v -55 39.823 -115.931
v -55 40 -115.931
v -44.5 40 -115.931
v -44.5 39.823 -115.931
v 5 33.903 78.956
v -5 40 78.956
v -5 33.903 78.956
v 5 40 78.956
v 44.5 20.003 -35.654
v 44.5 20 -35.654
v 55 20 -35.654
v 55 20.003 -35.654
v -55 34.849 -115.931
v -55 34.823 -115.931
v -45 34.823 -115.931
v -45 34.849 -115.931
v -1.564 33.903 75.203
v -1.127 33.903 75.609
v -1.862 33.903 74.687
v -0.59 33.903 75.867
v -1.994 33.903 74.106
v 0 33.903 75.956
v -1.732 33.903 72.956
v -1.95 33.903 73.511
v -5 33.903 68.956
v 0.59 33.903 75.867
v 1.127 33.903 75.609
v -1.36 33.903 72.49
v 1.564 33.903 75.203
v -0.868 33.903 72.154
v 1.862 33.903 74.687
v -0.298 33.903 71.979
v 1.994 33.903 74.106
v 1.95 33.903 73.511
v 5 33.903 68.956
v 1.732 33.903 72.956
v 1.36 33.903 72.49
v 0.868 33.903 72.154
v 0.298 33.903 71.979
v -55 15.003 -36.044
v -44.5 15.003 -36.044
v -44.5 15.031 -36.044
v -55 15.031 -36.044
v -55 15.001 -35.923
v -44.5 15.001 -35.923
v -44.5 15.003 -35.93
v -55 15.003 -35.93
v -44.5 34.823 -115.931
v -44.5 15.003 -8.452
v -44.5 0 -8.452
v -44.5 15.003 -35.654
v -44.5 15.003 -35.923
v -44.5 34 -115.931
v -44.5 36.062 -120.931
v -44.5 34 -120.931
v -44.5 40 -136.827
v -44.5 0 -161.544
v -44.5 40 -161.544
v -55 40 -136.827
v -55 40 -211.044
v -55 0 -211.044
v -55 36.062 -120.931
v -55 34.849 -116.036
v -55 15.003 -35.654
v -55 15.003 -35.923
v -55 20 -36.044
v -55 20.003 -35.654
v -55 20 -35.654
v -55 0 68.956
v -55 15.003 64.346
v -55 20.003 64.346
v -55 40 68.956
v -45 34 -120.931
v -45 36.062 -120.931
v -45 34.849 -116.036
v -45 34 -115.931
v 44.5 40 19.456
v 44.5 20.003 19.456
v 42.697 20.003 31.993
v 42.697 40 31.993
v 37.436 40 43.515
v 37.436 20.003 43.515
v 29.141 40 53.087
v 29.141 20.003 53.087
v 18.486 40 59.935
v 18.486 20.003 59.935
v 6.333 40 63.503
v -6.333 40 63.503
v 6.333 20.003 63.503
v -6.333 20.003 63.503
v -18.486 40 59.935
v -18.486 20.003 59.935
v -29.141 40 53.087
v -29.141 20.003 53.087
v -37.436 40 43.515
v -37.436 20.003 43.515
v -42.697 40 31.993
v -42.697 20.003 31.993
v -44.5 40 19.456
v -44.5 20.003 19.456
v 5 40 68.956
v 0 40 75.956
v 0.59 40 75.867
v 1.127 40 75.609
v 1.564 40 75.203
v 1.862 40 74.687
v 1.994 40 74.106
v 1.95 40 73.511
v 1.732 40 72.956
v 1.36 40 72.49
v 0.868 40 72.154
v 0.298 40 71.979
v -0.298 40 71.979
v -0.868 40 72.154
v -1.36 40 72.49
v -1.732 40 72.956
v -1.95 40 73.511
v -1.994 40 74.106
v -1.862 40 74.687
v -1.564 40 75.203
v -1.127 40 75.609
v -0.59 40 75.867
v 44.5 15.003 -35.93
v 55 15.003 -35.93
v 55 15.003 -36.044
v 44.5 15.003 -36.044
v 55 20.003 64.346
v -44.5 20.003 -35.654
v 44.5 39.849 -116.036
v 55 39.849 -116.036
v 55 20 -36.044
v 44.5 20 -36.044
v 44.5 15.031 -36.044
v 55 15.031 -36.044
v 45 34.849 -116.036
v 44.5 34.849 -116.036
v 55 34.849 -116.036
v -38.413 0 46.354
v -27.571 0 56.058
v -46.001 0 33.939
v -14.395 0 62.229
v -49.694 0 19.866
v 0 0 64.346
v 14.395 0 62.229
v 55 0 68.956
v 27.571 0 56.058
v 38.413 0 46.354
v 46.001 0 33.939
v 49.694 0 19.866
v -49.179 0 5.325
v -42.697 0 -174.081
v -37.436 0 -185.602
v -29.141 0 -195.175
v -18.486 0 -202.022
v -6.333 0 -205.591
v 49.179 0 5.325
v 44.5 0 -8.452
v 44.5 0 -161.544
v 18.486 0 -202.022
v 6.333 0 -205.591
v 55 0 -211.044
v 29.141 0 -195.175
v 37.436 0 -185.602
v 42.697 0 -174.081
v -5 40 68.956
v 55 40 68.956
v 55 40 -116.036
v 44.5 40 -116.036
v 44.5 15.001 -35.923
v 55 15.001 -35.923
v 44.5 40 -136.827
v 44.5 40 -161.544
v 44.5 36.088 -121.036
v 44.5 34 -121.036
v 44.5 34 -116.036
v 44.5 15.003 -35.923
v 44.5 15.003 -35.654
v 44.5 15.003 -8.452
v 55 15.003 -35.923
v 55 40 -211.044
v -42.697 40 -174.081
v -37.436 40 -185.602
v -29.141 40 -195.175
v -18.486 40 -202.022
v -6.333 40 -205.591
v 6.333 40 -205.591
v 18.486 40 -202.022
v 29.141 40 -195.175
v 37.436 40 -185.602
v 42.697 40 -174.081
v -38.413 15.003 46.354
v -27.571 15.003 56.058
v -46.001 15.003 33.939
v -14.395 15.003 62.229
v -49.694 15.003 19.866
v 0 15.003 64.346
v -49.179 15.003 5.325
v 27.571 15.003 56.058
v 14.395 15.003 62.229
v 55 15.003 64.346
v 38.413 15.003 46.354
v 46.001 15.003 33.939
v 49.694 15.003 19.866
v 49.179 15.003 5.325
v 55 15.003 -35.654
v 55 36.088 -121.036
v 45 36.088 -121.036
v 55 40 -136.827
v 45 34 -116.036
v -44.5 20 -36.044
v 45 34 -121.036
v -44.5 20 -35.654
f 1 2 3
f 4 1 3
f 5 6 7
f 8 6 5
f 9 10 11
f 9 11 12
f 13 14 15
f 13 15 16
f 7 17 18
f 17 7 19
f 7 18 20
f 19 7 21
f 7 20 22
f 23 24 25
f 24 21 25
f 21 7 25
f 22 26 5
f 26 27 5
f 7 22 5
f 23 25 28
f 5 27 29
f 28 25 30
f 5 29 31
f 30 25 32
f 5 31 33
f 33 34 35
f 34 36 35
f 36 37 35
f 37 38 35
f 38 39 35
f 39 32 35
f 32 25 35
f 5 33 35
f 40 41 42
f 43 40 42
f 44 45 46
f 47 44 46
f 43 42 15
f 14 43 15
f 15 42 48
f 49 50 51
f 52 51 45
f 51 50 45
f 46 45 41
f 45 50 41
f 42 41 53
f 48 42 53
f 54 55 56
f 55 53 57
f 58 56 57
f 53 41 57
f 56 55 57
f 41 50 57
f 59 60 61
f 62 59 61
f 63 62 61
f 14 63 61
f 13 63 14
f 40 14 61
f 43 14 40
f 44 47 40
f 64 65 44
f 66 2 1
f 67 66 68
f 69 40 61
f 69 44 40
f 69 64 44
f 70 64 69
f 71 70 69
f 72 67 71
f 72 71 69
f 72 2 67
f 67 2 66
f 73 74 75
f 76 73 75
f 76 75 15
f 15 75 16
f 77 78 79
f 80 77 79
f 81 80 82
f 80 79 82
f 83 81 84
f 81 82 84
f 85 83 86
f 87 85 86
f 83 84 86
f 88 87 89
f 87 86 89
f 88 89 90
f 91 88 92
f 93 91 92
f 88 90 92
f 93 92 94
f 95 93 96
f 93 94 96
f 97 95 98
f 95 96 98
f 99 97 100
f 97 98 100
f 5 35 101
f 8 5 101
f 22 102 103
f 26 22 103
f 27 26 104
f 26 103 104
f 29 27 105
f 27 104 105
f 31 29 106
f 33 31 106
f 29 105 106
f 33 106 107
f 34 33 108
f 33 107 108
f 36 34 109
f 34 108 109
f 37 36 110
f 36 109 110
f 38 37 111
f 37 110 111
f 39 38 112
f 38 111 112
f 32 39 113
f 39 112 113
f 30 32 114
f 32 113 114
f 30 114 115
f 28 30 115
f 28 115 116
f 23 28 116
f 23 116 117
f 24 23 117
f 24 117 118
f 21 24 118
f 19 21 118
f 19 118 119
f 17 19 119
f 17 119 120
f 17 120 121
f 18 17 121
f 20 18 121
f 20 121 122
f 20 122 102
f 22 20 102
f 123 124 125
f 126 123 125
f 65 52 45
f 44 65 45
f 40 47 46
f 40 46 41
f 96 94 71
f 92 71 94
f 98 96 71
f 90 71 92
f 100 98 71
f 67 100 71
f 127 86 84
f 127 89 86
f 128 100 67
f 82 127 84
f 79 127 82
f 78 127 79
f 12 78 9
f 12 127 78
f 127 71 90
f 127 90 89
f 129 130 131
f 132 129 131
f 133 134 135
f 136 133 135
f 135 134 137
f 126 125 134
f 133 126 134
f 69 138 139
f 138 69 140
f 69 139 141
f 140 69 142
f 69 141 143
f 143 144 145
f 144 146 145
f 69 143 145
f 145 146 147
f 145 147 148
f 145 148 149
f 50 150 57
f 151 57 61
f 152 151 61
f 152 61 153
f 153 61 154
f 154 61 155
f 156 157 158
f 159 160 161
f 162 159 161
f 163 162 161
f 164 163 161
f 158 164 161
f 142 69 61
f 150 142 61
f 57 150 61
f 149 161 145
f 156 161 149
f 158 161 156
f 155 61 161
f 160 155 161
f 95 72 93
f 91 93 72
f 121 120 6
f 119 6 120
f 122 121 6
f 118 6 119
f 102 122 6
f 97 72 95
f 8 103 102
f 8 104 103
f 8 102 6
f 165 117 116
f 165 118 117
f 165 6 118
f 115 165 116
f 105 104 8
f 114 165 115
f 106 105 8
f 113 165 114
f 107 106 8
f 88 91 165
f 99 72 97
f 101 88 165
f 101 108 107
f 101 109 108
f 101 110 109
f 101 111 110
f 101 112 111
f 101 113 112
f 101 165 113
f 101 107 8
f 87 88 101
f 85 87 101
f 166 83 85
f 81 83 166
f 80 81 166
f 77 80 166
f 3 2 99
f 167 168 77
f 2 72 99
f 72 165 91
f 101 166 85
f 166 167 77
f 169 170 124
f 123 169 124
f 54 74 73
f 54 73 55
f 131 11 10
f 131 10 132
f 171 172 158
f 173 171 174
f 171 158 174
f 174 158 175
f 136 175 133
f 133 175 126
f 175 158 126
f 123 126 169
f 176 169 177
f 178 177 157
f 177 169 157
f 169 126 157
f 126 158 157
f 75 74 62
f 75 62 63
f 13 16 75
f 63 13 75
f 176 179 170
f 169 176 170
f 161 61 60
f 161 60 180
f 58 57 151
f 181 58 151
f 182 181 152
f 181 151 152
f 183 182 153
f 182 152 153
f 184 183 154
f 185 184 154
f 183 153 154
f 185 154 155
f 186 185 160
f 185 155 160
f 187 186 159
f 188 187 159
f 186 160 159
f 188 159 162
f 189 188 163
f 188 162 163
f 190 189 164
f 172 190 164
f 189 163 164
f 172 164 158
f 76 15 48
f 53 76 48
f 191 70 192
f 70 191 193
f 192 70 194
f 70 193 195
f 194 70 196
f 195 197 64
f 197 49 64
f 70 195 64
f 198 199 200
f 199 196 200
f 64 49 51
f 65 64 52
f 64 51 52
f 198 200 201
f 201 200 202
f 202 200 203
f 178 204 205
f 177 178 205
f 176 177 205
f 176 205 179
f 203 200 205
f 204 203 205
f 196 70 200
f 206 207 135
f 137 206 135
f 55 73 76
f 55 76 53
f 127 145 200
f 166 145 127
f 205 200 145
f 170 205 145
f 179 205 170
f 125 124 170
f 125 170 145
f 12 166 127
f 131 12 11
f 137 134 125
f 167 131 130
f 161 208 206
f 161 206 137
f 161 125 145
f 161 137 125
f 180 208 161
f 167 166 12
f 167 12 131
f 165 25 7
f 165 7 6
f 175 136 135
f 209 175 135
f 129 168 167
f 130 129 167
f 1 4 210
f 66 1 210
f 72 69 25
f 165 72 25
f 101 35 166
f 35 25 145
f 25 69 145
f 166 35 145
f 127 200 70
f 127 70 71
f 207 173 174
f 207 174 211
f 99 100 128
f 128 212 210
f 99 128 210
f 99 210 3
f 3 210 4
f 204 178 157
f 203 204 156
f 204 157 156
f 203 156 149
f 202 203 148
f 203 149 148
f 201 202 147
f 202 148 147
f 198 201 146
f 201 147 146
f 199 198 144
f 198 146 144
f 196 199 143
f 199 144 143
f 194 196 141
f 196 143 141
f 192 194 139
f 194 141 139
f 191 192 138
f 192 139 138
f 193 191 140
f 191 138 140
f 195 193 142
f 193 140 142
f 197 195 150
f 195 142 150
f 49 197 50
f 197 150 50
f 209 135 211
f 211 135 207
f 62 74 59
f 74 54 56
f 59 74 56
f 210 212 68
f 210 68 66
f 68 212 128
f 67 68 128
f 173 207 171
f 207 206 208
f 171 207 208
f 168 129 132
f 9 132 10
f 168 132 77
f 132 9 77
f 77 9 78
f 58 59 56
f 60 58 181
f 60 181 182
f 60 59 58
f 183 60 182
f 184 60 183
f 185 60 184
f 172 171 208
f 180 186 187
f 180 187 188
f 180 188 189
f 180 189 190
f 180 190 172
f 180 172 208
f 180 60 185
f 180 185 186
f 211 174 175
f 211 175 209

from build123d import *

# Parameters (mm, degrees)
SKETCH1_W           = 110
SKETCH1_H           = 280
BOSS_EXTRUDE1_DEPTH = 40
CUT_EXTRUDE2_DEPTH  = 124
SKETCH3_W           = 10.5
SKETCH3_H           = 5
CUT_EXTRUDE3_DEPTH  = 6
SKETCH4_W           = 10.5
SKETCH4_H           = 5
CUT_EXTRUDE4_DEPTH  = 6
CUT_EXTRUDE5_DEPTH  = 115
SKETCH6_W           = 5
SKETCH6_H           = 2.06188551
BOSS_EXTRUDE2_DEPTH = 10
SKETCH7_W           = 5
SKETCH7_H           = 2.339578052
BOSS_EXTRUDE3_DEPTH = 10
CUT_EXTRUDE6_DEPTH  = 128
SKETCH9_W           = 0.104698151
SKETCH9_H           = 1.212792293
CUT_EXTRUDE7_DEPTH  = 128
SKETCH10_W          = 100
SKETCH10_H          = 5
CUT_EXTRUDE9_DEPTH  = 128
SKETCH11_W          = 0.390083634
SKETCH11_H          = 4.996690545
CUT_EXTRUDE10_DEPTH = 128
SKETCH13_R          = 50
CUT_EXTRUDE11_DEPTH = 20
SKETCH14_W          = 10
SKETCH14_H          = 6.096695991
BOSS_EXTRUDE4_DEPTH = 10
SKETCH15_R          = 2
CUT_EXTRUDE12_DEPTH = 10


with BuildPart() as part:
    # Sketch1 → Boss-Extrude1 (new body)
    with BuildSketch(Plane(origin=(0, 0, 0), x_dir=(1, 0, 0), z_dir=(0, 1, 0))):
        with Locations((0, 71.043668932)):
            Rectangle(SKETCH1_W, SKETCH1_H)
        with BuildLine():
            Line((-44.5, -19.456331068), (-44.5, 161.543668932))
            ThreePointArc((-44.5, 161.543668932), (0, 206.043668932), (44.5, 161.543668932))
            Line((44.5, 161.543668932), (44.5, -19.456331068))
            ThreePointArc((44.5, -19.456331068), (0, -63.956331068), (-44.5, -19.456331068))
        make_face(mode=Mode.SUBTRACT)
    extrude(amount=BOSS_EXTRUDE1_DEPTH)

    # Sketch2 → Cut-Extrude2 (cut)
    with BuildSketch(Plane(origin=(55, 0, 0), x_dir=(0, 0, -1), z_dir=(1, 0, 0))):
        Polygon((116.043668932, 39.851089724), (36.043668932, 20), (35.922836705, 15.001460256), (116.043668932, 34.851089724), align=None)
    extrude(amount=-CUT_EXTRUDE2_DEPTH, mode=Mode.SUBTRACT)

    # Sketch3 → Cut-Extrude3 (cut)
    with BuildSketch(Plane(origin=(0, 40, 0), x_dir=(1, 0, 0), z_dir=(0, 1, 0))):
        with Locations((49.75, 118.535610254)):
            Rectangle(SKETCH3_W, SKETCH3_H)
    extrude(amount=-CUT_EXTRUDE3_DEPTH, mode=Mode.SUBTRACT)

    # Sketch4 → Cut-Extrude4 (cut)
    with BuildSketch(Plane(origin=(0, 40, 0), x_dir=(1, 0, 0), z_dir=(0, 1, 0))):
        with Locations((-49.75, 118.430912103)):
            Rectangle(SKETCH4_W, SKETCH4_H)
    extrude(amount=-CUT_EXTRUDE4_DEPTH, mode=Mode.SUBTRACT)

    # Sketch5 → Cut-Extrude5 (cut)
    with BuildSketch(Plane(origin=(55, 0, 0), x_dir=(0, 0, -1), z_dir=(1, 0, 0))):
        Polygon((116.035610254, 34.849093217), (136.82667534, 40), (116.035610254, 40), align=None)
    extrude(amount=-CUT_EXTRUDE5_DEPTH, mode=Mode.SUBTRACT)

    # Sketch6 → Boss-Extrude2 (add)
    with BuildSketch(Plane.ZY.offset(55)):
        with Locations((-118.430912103, 35.030942755)):
            Rectangle(SKETCH6_W, SKETCH6_H)
    extrude(amount=-BOSS_EXTRUDE2_DEPTH)

    # Sketch7 → Boss-Extrude3 (add)
    with BuildSketch(Plane(origin=(55, 0, 0), x_dir=(0, 0, -1), z_dir=(1, 0, 0))):
        with Locations((118.535610254, 35.169789026)):
            Rectangle(SKETCH7_W, SKETCH7_H)
    extrude(amount=-BOSS_EXTRUDE3_DEPTH)

    # Sketch8 → Cut-Extrude6 (cut)
    with BuildSketch(Plane(origin=(55, 0, 0), x_dir=(0, 0, -1), z_dir=(1, 0, 0))):
        Polygon((121.035610254, 36.087824076), (116.035610254, 34.849093217), (116.035610254, 36.339578052), (121.035610254, 36.339578052), align=None)
    extrude(amount=-CUT_EXTRUDE6_DEPTH, mode=Mode.SUBTRACT)

    # Sketch9 → Cut-Extrude7 (cut)
    with BuildSketch(Plane(origin=(-45, 0, 0), x_dir=(0, 0, -1), z_dir=(1, 0, 0))):
        with Locations((115.983261179, 35.455489364)):
            Rectangle(SKETCH9_W, SKETCH9_H)
    extrude(amount=-CUT_EXTRUDE7_DEPTH, mode=Mode.SUBTRACT)

    # Sketch10 → Cut-Extrude9 (cut)
    with BuildSketch(Plane(origin=(55, 0, 0), x_dir=(0, 0, -1), z_dir=(1, 0, 0))):
        with Locations((-14.346414702, 17.503309455)):
            Rectangle(SKETCH10_W, SKETCH10_H)
    extrude(amount=-CUT_EXTRUDE9_DEPTH, mode=Mode.SUBTRACT)

    # Sketch11 → Cut-Extrude10 (cut)
    with BuildSketch(Plane(origin=(55, 0, 0), x_dir=(0, 0, -1), z_dir=(1, 0, 0))):
        with Locations((35.848627115, 17.501654728)):
            Rectangle(SKETCH11_W, SKETCH11_H)
    extrude(amount=-CUT_EXTRUDE10_DEPTH, mode=Mode.SUBTRACT)

    # Sketch13 → Cut-Extrude11 (cut)
    with BuildSketch(Plane(origin=(0, 0, 0), x_dir=(-1, 0, 0), z_dir=(0, -1, 0))):
        with Locations((0, -14.346331068)):
            Circle(SKETCH13_R)
    extrude(amount=-CUT_EXTRUDE11_DEPTH, mode=Mode.SUBTRACT)

    # Sketch14 → Boss-Extrude4 (add)
    with BuildSketch(Plane.XY.offset(68.956331068)):
        with Locations((0, 36.951652005)):
            Rectangle(SKETCH14_W, SKETCH14_H)
    extrude(amount=BOSS_EXTRUDE4_DEPTH)

    # Sketch15 → Cut-Extrude12 (cut)
    with BuildSketch(Plane(origin=(0, 40, 0), x_dir=(1, 0, 0), z_dir=(0, 1, 0))):
        with Locations(Location((0, -73.956331068, 0), (0, 0, 270))):
            Circle(SKETCH15_R)
    extrude(amount=-CUT_EXTRUDE12_DEPTH, mode=Mode.SUBTRACT)


solid = part.part
